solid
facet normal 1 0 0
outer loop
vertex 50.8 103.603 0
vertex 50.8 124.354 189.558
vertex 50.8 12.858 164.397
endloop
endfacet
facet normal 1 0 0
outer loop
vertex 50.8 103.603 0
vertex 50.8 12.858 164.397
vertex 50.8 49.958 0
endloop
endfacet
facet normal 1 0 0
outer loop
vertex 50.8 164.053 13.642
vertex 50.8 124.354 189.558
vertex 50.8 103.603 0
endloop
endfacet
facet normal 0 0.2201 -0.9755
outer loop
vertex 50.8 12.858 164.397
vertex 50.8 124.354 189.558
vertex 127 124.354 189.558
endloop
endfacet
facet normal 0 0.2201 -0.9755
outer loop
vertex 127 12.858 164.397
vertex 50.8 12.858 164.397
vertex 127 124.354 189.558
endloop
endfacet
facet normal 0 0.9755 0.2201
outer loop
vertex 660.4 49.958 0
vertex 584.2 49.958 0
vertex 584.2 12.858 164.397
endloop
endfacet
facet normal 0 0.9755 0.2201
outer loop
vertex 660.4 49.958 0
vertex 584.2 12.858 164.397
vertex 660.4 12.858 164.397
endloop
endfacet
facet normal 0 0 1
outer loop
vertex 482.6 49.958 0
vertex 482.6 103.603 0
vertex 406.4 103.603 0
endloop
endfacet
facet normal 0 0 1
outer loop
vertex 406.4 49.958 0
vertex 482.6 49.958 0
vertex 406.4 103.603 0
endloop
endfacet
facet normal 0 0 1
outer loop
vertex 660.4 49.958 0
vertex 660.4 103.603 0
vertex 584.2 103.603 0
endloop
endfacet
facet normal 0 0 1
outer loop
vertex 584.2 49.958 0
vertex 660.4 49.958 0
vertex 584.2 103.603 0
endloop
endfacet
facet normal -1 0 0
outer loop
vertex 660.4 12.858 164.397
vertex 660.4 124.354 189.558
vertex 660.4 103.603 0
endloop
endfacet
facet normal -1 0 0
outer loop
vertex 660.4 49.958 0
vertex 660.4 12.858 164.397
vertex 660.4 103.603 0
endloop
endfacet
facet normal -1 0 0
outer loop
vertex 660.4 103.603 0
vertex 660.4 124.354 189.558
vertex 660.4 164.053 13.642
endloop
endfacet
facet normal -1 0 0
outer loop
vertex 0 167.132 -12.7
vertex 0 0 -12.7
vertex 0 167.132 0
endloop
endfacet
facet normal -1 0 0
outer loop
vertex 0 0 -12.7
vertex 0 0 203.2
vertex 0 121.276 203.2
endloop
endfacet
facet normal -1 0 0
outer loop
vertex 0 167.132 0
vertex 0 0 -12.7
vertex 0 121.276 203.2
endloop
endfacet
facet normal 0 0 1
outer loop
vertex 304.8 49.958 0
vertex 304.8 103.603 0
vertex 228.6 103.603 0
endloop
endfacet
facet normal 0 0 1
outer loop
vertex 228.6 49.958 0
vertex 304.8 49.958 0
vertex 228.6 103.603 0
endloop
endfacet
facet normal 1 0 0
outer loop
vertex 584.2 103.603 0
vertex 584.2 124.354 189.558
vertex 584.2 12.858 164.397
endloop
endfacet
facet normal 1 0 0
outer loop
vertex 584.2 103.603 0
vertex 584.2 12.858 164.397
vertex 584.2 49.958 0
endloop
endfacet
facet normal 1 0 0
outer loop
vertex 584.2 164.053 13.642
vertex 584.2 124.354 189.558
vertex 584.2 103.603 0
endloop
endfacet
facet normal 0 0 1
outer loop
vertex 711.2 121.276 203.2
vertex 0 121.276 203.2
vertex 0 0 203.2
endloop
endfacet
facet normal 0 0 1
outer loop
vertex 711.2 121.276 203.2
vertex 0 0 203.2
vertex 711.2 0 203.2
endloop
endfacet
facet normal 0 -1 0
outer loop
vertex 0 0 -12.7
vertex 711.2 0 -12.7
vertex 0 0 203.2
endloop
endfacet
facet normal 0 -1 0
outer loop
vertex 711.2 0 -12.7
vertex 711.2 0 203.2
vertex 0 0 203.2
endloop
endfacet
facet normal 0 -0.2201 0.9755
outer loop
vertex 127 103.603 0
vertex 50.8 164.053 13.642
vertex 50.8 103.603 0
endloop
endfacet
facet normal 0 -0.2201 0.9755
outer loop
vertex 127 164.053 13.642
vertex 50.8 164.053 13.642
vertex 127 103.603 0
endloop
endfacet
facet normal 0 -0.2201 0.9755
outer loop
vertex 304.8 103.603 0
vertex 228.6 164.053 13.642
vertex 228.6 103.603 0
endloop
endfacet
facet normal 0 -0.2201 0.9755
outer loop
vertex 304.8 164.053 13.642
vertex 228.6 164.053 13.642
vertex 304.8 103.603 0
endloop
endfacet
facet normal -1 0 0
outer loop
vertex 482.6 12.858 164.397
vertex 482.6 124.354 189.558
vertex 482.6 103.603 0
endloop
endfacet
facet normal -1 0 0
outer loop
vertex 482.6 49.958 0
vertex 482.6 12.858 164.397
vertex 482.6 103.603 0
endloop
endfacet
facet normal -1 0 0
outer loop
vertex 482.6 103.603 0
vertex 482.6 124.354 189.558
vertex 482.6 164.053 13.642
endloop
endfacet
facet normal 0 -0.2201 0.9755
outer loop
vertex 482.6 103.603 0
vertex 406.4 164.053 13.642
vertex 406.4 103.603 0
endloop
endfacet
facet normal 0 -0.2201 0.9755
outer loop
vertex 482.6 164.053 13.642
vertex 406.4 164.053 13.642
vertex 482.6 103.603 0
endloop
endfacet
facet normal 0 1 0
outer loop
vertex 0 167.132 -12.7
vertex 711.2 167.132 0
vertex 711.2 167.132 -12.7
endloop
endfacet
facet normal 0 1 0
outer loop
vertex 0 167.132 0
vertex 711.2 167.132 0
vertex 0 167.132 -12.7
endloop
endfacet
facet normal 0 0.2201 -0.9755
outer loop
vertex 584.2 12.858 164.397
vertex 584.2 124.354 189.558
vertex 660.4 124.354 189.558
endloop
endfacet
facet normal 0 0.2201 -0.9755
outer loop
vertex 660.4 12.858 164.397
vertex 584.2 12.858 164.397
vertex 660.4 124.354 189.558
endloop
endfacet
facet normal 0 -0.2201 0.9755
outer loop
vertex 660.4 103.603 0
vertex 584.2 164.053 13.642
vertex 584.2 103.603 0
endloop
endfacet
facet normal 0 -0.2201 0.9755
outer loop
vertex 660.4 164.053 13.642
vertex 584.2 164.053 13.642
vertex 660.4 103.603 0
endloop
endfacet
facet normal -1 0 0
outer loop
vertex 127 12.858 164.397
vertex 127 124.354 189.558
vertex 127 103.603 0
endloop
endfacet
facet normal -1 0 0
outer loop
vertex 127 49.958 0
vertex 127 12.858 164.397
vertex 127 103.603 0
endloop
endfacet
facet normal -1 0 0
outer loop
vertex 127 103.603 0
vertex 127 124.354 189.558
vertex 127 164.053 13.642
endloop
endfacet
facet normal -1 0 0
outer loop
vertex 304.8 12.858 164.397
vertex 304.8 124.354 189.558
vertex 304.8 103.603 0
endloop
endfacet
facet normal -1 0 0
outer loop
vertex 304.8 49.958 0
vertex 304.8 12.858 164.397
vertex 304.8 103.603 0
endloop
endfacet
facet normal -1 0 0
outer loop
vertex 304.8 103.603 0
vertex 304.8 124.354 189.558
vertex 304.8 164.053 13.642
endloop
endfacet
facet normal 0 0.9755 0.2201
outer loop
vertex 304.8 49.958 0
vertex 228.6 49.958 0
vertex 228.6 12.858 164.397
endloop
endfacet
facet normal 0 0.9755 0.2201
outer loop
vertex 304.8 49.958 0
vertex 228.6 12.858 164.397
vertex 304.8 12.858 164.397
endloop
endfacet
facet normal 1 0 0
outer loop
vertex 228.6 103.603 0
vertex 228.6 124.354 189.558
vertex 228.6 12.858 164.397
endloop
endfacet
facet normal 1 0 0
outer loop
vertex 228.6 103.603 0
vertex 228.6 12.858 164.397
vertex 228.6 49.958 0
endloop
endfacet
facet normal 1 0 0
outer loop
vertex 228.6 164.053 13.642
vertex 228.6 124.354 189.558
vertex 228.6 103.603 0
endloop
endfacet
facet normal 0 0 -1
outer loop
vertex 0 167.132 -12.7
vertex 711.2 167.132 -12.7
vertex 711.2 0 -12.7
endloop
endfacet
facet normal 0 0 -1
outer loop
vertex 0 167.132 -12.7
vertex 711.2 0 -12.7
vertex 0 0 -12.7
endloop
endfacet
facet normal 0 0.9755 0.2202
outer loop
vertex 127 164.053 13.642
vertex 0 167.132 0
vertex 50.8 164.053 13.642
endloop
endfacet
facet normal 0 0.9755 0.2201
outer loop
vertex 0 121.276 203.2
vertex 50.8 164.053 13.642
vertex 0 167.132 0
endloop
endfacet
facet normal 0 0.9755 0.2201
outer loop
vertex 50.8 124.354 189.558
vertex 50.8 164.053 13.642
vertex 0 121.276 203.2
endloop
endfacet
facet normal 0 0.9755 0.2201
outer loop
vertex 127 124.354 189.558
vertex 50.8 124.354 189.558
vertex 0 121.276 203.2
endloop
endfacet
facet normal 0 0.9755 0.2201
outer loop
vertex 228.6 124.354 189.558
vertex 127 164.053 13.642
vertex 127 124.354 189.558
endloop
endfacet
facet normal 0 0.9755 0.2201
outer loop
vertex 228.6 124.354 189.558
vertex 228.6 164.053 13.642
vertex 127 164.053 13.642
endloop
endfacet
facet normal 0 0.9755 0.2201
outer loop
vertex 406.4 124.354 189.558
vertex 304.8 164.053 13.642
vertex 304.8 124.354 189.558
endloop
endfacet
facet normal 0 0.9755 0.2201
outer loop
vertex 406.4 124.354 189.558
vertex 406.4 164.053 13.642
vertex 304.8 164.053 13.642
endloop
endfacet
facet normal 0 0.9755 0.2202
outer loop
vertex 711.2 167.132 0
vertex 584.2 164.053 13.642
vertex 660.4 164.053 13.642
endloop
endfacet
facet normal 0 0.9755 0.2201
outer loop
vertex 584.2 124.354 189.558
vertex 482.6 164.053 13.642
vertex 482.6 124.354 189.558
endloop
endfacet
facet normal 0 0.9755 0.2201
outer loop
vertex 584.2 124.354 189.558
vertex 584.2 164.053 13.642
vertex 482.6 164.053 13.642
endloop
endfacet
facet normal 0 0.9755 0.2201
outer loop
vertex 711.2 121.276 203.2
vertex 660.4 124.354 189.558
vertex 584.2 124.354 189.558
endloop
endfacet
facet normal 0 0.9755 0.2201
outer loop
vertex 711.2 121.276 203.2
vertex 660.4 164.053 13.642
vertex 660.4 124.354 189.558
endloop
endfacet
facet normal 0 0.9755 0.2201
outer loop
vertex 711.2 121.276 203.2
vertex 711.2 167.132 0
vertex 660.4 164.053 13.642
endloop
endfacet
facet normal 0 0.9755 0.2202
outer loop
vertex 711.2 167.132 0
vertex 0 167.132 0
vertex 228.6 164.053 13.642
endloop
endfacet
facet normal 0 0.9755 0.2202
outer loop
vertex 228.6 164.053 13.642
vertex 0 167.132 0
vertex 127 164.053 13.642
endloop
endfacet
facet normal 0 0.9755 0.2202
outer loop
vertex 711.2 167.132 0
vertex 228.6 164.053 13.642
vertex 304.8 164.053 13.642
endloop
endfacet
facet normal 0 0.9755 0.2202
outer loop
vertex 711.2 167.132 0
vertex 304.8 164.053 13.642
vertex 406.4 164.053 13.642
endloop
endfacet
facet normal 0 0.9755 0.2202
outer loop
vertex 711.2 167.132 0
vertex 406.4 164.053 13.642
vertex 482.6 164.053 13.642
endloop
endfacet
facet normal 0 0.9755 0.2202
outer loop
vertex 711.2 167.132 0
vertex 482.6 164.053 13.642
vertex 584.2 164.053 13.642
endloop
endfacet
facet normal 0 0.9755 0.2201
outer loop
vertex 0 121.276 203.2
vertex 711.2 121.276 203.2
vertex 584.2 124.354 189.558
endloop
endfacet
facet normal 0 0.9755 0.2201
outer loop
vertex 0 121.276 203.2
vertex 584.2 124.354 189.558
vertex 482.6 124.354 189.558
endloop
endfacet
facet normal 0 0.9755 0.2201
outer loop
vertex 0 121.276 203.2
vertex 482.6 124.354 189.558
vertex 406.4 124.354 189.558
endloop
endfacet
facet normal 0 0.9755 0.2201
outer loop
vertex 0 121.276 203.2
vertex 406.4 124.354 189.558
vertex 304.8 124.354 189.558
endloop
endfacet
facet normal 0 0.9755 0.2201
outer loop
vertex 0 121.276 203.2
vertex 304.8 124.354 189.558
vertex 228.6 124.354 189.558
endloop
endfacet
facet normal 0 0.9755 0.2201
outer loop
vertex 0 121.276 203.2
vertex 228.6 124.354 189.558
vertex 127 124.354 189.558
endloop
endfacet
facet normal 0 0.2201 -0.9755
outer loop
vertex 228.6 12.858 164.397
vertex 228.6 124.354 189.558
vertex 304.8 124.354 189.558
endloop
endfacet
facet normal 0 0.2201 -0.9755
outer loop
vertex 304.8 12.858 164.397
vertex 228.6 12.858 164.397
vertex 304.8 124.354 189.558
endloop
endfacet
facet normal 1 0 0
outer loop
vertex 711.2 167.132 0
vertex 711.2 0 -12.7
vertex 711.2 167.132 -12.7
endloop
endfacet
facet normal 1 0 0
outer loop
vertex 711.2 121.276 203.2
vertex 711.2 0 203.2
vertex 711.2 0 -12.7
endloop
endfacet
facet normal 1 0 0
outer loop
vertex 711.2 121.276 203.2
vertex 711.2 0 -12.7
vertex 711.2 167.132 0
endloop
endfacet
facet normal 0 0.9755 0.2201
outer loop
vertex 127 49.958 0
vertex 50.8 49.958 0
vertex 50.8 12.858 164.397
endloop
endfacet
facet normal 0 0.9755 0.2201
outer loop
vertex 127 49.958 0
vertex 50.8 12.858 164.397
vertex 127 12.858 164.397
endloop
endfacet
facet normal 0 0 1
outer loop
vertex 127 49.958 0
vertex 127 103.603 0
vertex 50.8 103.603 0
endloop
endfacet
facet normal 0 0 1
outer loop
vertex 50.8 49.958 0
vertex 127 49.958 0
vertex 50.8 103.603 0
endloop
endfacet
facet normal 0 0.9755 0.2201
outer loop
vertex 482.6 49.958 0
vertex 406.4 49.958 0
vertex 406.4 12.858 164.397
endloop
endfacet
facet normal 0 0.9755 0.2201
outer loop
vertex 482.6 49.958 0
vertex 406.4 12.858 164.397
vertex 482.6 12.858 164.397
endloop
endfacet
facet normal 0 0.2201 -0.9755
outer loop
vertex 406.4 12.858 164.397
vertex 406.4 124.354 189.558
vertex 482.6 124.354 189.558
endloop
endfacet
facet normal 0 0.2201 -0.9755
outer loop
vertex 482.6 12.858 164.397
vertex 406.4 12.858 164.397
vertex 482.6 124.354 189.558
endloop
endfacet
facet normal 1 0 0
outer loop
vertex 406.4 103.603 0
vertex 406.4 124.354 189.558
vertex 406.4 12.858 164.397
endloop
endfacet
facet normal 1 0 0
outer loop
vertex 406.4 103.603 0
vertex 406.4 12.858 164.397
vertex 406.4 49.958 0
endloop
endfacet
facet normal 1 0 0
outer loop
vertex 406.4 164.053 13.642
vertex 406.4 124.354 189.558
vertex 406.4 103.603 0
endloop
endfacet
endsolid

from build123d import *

# Parameters (mm, degrees)
SKETCH1_W           = 711.2
SKETCH1_H           = 167.132
BOSS_EXTRUDE2_DEPTH = 203.2
CUT_EXTRUDE3_DEPTH  = 919.48
SKETCH6_W           = 76.2
SKETCH6_H           = 180.34
CUT_EXTRUDE5_DEPTH  = 114.3
SKETCH7_W           = 711.2
SKETCH7_H           = 167.132
BOSS_EXTRUDE3_DEPTH = 12.7


with BuildPart() as part:
    # Sketch1 → Boss-Extrude2 (new body)
    with BuildSketch(Plane.XY):
        with Locations((355.6, 83.566)):
            Rectangle(SKETCH1_W, SKETCH1_H)
    extrude(amount=BOSS_EXTRUDE2_DEPTH)

    # Sketch5 → Cut-Extrude3 (cut)
    with BuildSketch(Plane(origin=(711.2, 0, 0), x_dir=(0, 0, -1), z_dir=(1, 0, 0))):
        Polygon((0, 167.132), (-203.2, 121.275720121), (-203.2, 167.132), align=None)
    extrude(amount=-CUT_EXTRUDE3_DEPTH, mode=Mode.SUBTRACT)

    # Sketch6 → Cut-Extrude5 (cut)
    with BuildSketch(Plane(origin=(0, 159.032892036, 35.88905909), x_dir=(1, 0, 0), z_dir=(0, 0.9754694514544971, 0.22013484340072725))):
        with Locations((266.7, -67.363402116)):
            Rectangle(SKETCH6_W, SKETCH6_H)
        with Locations((88.9, -67.363402116)):
            Rectangle(SKETCH6_W, SKETCH6_H)
        with Locations((444.5, -67.363402116)):
            Rectangle(SKETCH6_W, SKETCH6_H)
        with Locations((622.3, -67.363402116)):
            Rectangle(SKETCH6_W, SKETCH6_H)
    extrude(amount=-CUT_EXTRUDE5_DEPTH, mode=Mode.SUBTRACT)

    # Sketch7 → Boss-Extrude3 (add)
    with BuildSketch(Plane(origin=(0, 0, 0), x_dir=(-1, 0, 0), z_dir=(0, 0, -1))):
        with Locations((-355.6, 83.566)):
            Rectangle(SKETCH7_W, SKETCH7_H)
    extrude(amount=BOSS_EXTRUDE3_DEPTH)


solid = part.part
